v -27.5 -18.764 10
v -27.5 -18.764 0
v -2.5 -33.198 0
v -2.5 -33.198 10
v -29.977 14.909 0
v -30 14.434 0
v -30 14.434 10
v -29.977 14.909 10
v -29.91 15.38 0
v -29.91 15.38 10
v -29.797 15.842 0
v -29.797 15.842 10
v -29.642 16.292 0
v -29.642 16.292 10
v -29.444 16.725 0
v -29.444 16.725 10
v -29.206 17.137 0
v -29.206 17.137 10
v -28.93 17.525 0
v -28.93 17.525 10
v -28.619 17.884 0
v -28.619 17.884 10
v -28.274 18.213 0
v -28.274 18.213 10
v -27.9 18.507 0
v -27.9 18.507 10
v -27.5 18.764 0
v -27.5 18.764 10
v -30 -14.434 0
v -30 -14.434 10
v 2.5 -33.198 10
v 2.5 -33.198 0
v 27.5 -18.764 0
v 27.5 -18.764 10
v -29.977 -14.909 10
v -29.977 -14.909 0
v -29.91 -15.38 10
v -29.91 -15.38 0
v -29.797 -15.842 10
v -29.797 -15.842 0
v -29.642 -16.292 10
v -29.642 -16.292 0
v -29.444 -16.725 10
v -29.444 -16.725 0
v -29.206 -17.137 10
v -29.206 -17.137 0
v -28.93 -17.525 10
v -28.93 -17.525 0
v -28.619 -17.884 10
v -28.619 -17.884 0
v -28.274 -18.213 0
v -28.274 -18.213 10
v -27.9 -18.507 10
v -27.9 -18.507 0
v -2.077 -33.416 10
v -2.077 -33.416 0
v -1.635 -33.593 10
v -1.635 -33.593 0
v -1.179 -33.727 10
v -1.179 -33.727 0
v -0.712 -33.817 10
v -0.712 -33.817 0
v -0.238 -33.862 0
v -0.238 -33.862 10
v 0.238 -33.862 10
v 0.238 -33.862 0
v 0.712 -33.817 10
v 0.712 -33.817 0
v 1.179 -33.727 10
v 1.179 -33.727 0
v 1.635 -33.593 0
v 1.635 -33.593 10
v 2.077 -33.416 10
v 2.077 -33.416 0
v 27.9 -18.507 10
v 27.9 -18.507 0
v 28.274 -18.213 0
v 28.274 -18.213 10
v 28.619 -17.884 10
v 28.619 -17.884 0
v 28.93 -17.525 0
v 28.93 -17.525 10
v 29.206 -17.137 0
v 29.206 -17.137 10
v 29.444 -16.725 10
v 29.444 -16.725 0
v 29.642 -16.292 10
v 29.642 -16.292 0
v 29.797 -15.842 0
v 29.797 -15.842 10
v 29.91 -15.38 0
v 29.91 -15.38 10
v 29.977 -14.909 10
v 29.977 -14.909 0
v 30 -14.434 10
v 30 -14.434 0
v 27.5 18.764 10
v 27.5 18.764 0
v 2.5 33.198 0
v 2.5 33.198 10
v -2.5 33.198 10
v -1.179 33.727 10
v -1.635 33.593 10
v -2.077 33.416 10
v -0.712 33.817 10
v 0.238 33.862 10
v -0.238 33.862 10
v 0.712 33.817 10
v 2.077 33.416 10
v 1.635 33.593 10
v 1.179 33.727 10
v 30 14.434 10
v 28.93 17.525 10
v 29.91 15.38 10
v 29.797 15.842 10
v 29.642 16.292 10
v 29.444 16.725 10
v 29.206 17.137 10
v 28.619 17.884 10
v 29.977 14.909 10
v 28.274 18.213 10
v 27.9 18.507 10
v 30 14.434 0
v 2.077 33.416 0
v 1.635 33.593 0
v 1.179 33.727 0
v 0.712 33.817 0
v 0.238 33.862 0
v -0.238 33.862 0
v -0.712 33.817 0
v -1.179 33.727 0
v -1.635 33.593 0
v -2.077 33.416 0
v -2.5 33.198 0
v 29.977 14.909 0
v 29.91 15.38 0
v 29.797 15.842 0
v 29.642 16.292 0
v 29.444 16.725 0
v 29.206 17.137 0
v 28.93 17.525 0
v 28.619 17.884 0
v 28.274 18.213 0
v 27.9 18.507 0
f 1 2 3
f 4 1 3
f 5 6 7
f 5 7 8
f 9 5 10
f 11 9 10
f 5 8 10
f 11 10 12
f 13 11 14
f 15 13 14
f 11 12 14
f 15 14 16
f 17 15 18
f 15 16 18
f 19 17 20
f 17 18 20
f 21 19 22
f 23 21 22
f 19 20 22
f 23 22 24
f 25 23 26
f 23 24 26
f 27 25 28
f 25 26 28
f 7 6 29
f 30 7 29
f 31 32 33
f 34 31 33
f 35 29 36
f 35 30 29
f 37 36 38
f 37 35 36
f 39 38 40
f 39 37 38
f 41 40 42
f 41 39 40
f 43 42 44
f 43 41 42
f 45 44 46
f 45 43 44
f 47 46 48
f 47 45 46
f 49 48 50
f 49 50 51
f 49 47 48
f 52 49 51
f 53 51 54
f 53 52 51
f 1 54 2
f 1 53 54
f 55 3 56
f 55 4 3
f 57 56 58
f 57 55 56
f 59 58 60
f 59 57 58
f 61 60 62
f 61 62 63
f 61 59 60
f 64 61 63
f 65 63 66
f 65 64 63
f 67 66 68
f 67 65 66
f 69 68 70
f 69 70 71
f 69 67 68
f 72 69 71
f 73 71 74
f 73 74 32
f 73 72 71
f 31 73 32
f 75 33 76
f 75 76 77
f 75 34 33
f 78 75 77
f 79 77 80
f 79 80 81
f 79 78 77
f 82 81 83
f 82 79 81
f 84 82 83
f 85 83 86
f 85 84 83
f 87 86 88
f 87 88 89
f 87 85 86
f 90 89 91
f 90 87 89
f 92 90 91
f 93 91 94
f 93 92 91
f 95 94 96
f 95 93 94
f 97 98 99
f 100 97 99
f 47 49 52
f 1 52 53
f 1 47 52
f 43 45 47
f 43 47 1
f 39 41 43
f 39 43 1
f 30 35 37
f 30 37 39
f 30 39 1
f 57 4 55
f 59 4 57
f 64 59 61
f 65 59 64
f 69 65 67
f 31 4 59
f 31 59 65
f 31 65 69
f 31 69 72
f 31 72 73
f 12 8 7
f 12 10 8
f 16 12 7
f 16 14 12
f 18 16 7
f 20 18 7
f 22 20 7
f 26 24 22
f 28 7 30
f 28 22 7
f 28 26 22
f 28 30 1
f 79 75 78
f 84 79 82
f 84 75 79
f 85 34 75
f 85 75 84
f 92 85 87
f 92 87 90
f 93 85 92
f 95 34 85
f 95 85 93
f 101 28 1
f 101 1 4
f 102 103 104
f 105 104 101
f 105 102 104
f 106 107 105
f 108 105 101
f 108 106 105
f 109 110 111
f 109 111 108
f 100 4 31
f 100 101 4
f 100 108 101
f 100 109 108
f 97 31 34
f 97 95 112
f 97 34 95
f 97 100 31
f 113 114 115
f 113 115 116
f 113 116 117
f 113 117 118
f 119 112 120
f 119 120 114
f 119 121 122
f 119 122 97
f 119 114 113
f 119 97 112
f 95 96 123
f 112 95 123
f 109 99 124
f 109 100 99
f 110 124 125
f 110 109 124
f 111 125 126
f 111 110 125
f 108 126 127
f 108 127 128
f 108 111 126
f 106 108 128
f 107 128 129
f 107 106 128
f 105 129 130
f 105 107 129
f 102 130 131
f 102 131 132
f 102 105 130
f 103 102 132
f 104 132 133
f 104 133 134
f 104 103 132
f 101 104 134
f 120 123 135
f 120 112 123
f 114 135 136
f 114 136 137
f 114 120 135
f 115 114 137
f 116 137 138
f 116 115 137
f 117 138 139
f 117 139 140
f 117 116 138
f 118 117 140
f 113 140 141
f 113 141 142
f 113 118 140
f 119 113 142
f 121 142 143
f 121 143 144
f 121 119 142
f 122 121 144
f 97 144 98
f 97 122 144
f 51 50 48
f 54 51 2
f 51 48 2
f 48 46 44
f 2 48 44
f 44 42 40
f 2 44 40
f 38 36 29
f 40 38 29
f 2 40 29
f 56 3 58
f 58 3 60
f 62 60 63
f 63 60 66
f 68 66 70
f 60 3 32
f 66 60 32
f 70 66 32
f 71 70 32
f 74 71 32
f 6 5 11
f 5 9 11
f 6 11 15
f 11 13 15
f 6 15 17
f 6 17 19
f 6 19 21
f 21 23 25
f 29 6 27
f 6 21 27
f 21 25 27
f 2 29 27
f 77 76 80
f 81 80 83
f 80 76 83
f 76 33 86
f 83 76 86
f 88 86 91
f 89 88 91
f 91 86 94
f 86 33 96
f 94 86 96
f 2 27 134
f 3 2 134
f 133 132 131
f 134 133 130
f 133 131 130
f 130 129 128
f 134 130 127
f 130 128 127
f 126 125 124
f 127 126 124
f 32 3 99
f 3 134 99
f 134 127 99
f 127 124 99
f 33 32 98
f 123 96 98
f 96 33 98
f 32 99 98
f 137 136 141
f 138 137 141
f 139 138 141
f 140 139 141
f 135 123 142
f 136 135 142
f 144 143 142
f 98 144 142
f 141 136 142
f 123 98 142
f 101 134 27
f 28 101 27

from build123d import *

# Parameters (mm, degrees)
PAD_DEPTH = 10
FILLET_R  = 5


with BuildPart() as part:
    # Sketch → Pad (new body)
    with BuildSketch(Plane.XY):
        Polygon((-30, 17.320508), (-30, -17.320508), (0, -34.641016), (30, -17.320508), (30, 17.320508), (0, 34.641016), align=None)
    extrude(amount=PAD_DEPTH)

    # Fillet
    fillet_edges = [part.edges().sort_by_distance(p)[0] for p in [
        (-30, 17.320508, 5),
        (-30, -17.320508, 5),
        (0, -34.641016, 5),
        (30, -17.320508, 5),
        (30, 17.320508, 5),
        (0, 34.641016, 5),
    ]]
    fillet(fillet_edges, radius=FILLET_R)


solid = part.part
